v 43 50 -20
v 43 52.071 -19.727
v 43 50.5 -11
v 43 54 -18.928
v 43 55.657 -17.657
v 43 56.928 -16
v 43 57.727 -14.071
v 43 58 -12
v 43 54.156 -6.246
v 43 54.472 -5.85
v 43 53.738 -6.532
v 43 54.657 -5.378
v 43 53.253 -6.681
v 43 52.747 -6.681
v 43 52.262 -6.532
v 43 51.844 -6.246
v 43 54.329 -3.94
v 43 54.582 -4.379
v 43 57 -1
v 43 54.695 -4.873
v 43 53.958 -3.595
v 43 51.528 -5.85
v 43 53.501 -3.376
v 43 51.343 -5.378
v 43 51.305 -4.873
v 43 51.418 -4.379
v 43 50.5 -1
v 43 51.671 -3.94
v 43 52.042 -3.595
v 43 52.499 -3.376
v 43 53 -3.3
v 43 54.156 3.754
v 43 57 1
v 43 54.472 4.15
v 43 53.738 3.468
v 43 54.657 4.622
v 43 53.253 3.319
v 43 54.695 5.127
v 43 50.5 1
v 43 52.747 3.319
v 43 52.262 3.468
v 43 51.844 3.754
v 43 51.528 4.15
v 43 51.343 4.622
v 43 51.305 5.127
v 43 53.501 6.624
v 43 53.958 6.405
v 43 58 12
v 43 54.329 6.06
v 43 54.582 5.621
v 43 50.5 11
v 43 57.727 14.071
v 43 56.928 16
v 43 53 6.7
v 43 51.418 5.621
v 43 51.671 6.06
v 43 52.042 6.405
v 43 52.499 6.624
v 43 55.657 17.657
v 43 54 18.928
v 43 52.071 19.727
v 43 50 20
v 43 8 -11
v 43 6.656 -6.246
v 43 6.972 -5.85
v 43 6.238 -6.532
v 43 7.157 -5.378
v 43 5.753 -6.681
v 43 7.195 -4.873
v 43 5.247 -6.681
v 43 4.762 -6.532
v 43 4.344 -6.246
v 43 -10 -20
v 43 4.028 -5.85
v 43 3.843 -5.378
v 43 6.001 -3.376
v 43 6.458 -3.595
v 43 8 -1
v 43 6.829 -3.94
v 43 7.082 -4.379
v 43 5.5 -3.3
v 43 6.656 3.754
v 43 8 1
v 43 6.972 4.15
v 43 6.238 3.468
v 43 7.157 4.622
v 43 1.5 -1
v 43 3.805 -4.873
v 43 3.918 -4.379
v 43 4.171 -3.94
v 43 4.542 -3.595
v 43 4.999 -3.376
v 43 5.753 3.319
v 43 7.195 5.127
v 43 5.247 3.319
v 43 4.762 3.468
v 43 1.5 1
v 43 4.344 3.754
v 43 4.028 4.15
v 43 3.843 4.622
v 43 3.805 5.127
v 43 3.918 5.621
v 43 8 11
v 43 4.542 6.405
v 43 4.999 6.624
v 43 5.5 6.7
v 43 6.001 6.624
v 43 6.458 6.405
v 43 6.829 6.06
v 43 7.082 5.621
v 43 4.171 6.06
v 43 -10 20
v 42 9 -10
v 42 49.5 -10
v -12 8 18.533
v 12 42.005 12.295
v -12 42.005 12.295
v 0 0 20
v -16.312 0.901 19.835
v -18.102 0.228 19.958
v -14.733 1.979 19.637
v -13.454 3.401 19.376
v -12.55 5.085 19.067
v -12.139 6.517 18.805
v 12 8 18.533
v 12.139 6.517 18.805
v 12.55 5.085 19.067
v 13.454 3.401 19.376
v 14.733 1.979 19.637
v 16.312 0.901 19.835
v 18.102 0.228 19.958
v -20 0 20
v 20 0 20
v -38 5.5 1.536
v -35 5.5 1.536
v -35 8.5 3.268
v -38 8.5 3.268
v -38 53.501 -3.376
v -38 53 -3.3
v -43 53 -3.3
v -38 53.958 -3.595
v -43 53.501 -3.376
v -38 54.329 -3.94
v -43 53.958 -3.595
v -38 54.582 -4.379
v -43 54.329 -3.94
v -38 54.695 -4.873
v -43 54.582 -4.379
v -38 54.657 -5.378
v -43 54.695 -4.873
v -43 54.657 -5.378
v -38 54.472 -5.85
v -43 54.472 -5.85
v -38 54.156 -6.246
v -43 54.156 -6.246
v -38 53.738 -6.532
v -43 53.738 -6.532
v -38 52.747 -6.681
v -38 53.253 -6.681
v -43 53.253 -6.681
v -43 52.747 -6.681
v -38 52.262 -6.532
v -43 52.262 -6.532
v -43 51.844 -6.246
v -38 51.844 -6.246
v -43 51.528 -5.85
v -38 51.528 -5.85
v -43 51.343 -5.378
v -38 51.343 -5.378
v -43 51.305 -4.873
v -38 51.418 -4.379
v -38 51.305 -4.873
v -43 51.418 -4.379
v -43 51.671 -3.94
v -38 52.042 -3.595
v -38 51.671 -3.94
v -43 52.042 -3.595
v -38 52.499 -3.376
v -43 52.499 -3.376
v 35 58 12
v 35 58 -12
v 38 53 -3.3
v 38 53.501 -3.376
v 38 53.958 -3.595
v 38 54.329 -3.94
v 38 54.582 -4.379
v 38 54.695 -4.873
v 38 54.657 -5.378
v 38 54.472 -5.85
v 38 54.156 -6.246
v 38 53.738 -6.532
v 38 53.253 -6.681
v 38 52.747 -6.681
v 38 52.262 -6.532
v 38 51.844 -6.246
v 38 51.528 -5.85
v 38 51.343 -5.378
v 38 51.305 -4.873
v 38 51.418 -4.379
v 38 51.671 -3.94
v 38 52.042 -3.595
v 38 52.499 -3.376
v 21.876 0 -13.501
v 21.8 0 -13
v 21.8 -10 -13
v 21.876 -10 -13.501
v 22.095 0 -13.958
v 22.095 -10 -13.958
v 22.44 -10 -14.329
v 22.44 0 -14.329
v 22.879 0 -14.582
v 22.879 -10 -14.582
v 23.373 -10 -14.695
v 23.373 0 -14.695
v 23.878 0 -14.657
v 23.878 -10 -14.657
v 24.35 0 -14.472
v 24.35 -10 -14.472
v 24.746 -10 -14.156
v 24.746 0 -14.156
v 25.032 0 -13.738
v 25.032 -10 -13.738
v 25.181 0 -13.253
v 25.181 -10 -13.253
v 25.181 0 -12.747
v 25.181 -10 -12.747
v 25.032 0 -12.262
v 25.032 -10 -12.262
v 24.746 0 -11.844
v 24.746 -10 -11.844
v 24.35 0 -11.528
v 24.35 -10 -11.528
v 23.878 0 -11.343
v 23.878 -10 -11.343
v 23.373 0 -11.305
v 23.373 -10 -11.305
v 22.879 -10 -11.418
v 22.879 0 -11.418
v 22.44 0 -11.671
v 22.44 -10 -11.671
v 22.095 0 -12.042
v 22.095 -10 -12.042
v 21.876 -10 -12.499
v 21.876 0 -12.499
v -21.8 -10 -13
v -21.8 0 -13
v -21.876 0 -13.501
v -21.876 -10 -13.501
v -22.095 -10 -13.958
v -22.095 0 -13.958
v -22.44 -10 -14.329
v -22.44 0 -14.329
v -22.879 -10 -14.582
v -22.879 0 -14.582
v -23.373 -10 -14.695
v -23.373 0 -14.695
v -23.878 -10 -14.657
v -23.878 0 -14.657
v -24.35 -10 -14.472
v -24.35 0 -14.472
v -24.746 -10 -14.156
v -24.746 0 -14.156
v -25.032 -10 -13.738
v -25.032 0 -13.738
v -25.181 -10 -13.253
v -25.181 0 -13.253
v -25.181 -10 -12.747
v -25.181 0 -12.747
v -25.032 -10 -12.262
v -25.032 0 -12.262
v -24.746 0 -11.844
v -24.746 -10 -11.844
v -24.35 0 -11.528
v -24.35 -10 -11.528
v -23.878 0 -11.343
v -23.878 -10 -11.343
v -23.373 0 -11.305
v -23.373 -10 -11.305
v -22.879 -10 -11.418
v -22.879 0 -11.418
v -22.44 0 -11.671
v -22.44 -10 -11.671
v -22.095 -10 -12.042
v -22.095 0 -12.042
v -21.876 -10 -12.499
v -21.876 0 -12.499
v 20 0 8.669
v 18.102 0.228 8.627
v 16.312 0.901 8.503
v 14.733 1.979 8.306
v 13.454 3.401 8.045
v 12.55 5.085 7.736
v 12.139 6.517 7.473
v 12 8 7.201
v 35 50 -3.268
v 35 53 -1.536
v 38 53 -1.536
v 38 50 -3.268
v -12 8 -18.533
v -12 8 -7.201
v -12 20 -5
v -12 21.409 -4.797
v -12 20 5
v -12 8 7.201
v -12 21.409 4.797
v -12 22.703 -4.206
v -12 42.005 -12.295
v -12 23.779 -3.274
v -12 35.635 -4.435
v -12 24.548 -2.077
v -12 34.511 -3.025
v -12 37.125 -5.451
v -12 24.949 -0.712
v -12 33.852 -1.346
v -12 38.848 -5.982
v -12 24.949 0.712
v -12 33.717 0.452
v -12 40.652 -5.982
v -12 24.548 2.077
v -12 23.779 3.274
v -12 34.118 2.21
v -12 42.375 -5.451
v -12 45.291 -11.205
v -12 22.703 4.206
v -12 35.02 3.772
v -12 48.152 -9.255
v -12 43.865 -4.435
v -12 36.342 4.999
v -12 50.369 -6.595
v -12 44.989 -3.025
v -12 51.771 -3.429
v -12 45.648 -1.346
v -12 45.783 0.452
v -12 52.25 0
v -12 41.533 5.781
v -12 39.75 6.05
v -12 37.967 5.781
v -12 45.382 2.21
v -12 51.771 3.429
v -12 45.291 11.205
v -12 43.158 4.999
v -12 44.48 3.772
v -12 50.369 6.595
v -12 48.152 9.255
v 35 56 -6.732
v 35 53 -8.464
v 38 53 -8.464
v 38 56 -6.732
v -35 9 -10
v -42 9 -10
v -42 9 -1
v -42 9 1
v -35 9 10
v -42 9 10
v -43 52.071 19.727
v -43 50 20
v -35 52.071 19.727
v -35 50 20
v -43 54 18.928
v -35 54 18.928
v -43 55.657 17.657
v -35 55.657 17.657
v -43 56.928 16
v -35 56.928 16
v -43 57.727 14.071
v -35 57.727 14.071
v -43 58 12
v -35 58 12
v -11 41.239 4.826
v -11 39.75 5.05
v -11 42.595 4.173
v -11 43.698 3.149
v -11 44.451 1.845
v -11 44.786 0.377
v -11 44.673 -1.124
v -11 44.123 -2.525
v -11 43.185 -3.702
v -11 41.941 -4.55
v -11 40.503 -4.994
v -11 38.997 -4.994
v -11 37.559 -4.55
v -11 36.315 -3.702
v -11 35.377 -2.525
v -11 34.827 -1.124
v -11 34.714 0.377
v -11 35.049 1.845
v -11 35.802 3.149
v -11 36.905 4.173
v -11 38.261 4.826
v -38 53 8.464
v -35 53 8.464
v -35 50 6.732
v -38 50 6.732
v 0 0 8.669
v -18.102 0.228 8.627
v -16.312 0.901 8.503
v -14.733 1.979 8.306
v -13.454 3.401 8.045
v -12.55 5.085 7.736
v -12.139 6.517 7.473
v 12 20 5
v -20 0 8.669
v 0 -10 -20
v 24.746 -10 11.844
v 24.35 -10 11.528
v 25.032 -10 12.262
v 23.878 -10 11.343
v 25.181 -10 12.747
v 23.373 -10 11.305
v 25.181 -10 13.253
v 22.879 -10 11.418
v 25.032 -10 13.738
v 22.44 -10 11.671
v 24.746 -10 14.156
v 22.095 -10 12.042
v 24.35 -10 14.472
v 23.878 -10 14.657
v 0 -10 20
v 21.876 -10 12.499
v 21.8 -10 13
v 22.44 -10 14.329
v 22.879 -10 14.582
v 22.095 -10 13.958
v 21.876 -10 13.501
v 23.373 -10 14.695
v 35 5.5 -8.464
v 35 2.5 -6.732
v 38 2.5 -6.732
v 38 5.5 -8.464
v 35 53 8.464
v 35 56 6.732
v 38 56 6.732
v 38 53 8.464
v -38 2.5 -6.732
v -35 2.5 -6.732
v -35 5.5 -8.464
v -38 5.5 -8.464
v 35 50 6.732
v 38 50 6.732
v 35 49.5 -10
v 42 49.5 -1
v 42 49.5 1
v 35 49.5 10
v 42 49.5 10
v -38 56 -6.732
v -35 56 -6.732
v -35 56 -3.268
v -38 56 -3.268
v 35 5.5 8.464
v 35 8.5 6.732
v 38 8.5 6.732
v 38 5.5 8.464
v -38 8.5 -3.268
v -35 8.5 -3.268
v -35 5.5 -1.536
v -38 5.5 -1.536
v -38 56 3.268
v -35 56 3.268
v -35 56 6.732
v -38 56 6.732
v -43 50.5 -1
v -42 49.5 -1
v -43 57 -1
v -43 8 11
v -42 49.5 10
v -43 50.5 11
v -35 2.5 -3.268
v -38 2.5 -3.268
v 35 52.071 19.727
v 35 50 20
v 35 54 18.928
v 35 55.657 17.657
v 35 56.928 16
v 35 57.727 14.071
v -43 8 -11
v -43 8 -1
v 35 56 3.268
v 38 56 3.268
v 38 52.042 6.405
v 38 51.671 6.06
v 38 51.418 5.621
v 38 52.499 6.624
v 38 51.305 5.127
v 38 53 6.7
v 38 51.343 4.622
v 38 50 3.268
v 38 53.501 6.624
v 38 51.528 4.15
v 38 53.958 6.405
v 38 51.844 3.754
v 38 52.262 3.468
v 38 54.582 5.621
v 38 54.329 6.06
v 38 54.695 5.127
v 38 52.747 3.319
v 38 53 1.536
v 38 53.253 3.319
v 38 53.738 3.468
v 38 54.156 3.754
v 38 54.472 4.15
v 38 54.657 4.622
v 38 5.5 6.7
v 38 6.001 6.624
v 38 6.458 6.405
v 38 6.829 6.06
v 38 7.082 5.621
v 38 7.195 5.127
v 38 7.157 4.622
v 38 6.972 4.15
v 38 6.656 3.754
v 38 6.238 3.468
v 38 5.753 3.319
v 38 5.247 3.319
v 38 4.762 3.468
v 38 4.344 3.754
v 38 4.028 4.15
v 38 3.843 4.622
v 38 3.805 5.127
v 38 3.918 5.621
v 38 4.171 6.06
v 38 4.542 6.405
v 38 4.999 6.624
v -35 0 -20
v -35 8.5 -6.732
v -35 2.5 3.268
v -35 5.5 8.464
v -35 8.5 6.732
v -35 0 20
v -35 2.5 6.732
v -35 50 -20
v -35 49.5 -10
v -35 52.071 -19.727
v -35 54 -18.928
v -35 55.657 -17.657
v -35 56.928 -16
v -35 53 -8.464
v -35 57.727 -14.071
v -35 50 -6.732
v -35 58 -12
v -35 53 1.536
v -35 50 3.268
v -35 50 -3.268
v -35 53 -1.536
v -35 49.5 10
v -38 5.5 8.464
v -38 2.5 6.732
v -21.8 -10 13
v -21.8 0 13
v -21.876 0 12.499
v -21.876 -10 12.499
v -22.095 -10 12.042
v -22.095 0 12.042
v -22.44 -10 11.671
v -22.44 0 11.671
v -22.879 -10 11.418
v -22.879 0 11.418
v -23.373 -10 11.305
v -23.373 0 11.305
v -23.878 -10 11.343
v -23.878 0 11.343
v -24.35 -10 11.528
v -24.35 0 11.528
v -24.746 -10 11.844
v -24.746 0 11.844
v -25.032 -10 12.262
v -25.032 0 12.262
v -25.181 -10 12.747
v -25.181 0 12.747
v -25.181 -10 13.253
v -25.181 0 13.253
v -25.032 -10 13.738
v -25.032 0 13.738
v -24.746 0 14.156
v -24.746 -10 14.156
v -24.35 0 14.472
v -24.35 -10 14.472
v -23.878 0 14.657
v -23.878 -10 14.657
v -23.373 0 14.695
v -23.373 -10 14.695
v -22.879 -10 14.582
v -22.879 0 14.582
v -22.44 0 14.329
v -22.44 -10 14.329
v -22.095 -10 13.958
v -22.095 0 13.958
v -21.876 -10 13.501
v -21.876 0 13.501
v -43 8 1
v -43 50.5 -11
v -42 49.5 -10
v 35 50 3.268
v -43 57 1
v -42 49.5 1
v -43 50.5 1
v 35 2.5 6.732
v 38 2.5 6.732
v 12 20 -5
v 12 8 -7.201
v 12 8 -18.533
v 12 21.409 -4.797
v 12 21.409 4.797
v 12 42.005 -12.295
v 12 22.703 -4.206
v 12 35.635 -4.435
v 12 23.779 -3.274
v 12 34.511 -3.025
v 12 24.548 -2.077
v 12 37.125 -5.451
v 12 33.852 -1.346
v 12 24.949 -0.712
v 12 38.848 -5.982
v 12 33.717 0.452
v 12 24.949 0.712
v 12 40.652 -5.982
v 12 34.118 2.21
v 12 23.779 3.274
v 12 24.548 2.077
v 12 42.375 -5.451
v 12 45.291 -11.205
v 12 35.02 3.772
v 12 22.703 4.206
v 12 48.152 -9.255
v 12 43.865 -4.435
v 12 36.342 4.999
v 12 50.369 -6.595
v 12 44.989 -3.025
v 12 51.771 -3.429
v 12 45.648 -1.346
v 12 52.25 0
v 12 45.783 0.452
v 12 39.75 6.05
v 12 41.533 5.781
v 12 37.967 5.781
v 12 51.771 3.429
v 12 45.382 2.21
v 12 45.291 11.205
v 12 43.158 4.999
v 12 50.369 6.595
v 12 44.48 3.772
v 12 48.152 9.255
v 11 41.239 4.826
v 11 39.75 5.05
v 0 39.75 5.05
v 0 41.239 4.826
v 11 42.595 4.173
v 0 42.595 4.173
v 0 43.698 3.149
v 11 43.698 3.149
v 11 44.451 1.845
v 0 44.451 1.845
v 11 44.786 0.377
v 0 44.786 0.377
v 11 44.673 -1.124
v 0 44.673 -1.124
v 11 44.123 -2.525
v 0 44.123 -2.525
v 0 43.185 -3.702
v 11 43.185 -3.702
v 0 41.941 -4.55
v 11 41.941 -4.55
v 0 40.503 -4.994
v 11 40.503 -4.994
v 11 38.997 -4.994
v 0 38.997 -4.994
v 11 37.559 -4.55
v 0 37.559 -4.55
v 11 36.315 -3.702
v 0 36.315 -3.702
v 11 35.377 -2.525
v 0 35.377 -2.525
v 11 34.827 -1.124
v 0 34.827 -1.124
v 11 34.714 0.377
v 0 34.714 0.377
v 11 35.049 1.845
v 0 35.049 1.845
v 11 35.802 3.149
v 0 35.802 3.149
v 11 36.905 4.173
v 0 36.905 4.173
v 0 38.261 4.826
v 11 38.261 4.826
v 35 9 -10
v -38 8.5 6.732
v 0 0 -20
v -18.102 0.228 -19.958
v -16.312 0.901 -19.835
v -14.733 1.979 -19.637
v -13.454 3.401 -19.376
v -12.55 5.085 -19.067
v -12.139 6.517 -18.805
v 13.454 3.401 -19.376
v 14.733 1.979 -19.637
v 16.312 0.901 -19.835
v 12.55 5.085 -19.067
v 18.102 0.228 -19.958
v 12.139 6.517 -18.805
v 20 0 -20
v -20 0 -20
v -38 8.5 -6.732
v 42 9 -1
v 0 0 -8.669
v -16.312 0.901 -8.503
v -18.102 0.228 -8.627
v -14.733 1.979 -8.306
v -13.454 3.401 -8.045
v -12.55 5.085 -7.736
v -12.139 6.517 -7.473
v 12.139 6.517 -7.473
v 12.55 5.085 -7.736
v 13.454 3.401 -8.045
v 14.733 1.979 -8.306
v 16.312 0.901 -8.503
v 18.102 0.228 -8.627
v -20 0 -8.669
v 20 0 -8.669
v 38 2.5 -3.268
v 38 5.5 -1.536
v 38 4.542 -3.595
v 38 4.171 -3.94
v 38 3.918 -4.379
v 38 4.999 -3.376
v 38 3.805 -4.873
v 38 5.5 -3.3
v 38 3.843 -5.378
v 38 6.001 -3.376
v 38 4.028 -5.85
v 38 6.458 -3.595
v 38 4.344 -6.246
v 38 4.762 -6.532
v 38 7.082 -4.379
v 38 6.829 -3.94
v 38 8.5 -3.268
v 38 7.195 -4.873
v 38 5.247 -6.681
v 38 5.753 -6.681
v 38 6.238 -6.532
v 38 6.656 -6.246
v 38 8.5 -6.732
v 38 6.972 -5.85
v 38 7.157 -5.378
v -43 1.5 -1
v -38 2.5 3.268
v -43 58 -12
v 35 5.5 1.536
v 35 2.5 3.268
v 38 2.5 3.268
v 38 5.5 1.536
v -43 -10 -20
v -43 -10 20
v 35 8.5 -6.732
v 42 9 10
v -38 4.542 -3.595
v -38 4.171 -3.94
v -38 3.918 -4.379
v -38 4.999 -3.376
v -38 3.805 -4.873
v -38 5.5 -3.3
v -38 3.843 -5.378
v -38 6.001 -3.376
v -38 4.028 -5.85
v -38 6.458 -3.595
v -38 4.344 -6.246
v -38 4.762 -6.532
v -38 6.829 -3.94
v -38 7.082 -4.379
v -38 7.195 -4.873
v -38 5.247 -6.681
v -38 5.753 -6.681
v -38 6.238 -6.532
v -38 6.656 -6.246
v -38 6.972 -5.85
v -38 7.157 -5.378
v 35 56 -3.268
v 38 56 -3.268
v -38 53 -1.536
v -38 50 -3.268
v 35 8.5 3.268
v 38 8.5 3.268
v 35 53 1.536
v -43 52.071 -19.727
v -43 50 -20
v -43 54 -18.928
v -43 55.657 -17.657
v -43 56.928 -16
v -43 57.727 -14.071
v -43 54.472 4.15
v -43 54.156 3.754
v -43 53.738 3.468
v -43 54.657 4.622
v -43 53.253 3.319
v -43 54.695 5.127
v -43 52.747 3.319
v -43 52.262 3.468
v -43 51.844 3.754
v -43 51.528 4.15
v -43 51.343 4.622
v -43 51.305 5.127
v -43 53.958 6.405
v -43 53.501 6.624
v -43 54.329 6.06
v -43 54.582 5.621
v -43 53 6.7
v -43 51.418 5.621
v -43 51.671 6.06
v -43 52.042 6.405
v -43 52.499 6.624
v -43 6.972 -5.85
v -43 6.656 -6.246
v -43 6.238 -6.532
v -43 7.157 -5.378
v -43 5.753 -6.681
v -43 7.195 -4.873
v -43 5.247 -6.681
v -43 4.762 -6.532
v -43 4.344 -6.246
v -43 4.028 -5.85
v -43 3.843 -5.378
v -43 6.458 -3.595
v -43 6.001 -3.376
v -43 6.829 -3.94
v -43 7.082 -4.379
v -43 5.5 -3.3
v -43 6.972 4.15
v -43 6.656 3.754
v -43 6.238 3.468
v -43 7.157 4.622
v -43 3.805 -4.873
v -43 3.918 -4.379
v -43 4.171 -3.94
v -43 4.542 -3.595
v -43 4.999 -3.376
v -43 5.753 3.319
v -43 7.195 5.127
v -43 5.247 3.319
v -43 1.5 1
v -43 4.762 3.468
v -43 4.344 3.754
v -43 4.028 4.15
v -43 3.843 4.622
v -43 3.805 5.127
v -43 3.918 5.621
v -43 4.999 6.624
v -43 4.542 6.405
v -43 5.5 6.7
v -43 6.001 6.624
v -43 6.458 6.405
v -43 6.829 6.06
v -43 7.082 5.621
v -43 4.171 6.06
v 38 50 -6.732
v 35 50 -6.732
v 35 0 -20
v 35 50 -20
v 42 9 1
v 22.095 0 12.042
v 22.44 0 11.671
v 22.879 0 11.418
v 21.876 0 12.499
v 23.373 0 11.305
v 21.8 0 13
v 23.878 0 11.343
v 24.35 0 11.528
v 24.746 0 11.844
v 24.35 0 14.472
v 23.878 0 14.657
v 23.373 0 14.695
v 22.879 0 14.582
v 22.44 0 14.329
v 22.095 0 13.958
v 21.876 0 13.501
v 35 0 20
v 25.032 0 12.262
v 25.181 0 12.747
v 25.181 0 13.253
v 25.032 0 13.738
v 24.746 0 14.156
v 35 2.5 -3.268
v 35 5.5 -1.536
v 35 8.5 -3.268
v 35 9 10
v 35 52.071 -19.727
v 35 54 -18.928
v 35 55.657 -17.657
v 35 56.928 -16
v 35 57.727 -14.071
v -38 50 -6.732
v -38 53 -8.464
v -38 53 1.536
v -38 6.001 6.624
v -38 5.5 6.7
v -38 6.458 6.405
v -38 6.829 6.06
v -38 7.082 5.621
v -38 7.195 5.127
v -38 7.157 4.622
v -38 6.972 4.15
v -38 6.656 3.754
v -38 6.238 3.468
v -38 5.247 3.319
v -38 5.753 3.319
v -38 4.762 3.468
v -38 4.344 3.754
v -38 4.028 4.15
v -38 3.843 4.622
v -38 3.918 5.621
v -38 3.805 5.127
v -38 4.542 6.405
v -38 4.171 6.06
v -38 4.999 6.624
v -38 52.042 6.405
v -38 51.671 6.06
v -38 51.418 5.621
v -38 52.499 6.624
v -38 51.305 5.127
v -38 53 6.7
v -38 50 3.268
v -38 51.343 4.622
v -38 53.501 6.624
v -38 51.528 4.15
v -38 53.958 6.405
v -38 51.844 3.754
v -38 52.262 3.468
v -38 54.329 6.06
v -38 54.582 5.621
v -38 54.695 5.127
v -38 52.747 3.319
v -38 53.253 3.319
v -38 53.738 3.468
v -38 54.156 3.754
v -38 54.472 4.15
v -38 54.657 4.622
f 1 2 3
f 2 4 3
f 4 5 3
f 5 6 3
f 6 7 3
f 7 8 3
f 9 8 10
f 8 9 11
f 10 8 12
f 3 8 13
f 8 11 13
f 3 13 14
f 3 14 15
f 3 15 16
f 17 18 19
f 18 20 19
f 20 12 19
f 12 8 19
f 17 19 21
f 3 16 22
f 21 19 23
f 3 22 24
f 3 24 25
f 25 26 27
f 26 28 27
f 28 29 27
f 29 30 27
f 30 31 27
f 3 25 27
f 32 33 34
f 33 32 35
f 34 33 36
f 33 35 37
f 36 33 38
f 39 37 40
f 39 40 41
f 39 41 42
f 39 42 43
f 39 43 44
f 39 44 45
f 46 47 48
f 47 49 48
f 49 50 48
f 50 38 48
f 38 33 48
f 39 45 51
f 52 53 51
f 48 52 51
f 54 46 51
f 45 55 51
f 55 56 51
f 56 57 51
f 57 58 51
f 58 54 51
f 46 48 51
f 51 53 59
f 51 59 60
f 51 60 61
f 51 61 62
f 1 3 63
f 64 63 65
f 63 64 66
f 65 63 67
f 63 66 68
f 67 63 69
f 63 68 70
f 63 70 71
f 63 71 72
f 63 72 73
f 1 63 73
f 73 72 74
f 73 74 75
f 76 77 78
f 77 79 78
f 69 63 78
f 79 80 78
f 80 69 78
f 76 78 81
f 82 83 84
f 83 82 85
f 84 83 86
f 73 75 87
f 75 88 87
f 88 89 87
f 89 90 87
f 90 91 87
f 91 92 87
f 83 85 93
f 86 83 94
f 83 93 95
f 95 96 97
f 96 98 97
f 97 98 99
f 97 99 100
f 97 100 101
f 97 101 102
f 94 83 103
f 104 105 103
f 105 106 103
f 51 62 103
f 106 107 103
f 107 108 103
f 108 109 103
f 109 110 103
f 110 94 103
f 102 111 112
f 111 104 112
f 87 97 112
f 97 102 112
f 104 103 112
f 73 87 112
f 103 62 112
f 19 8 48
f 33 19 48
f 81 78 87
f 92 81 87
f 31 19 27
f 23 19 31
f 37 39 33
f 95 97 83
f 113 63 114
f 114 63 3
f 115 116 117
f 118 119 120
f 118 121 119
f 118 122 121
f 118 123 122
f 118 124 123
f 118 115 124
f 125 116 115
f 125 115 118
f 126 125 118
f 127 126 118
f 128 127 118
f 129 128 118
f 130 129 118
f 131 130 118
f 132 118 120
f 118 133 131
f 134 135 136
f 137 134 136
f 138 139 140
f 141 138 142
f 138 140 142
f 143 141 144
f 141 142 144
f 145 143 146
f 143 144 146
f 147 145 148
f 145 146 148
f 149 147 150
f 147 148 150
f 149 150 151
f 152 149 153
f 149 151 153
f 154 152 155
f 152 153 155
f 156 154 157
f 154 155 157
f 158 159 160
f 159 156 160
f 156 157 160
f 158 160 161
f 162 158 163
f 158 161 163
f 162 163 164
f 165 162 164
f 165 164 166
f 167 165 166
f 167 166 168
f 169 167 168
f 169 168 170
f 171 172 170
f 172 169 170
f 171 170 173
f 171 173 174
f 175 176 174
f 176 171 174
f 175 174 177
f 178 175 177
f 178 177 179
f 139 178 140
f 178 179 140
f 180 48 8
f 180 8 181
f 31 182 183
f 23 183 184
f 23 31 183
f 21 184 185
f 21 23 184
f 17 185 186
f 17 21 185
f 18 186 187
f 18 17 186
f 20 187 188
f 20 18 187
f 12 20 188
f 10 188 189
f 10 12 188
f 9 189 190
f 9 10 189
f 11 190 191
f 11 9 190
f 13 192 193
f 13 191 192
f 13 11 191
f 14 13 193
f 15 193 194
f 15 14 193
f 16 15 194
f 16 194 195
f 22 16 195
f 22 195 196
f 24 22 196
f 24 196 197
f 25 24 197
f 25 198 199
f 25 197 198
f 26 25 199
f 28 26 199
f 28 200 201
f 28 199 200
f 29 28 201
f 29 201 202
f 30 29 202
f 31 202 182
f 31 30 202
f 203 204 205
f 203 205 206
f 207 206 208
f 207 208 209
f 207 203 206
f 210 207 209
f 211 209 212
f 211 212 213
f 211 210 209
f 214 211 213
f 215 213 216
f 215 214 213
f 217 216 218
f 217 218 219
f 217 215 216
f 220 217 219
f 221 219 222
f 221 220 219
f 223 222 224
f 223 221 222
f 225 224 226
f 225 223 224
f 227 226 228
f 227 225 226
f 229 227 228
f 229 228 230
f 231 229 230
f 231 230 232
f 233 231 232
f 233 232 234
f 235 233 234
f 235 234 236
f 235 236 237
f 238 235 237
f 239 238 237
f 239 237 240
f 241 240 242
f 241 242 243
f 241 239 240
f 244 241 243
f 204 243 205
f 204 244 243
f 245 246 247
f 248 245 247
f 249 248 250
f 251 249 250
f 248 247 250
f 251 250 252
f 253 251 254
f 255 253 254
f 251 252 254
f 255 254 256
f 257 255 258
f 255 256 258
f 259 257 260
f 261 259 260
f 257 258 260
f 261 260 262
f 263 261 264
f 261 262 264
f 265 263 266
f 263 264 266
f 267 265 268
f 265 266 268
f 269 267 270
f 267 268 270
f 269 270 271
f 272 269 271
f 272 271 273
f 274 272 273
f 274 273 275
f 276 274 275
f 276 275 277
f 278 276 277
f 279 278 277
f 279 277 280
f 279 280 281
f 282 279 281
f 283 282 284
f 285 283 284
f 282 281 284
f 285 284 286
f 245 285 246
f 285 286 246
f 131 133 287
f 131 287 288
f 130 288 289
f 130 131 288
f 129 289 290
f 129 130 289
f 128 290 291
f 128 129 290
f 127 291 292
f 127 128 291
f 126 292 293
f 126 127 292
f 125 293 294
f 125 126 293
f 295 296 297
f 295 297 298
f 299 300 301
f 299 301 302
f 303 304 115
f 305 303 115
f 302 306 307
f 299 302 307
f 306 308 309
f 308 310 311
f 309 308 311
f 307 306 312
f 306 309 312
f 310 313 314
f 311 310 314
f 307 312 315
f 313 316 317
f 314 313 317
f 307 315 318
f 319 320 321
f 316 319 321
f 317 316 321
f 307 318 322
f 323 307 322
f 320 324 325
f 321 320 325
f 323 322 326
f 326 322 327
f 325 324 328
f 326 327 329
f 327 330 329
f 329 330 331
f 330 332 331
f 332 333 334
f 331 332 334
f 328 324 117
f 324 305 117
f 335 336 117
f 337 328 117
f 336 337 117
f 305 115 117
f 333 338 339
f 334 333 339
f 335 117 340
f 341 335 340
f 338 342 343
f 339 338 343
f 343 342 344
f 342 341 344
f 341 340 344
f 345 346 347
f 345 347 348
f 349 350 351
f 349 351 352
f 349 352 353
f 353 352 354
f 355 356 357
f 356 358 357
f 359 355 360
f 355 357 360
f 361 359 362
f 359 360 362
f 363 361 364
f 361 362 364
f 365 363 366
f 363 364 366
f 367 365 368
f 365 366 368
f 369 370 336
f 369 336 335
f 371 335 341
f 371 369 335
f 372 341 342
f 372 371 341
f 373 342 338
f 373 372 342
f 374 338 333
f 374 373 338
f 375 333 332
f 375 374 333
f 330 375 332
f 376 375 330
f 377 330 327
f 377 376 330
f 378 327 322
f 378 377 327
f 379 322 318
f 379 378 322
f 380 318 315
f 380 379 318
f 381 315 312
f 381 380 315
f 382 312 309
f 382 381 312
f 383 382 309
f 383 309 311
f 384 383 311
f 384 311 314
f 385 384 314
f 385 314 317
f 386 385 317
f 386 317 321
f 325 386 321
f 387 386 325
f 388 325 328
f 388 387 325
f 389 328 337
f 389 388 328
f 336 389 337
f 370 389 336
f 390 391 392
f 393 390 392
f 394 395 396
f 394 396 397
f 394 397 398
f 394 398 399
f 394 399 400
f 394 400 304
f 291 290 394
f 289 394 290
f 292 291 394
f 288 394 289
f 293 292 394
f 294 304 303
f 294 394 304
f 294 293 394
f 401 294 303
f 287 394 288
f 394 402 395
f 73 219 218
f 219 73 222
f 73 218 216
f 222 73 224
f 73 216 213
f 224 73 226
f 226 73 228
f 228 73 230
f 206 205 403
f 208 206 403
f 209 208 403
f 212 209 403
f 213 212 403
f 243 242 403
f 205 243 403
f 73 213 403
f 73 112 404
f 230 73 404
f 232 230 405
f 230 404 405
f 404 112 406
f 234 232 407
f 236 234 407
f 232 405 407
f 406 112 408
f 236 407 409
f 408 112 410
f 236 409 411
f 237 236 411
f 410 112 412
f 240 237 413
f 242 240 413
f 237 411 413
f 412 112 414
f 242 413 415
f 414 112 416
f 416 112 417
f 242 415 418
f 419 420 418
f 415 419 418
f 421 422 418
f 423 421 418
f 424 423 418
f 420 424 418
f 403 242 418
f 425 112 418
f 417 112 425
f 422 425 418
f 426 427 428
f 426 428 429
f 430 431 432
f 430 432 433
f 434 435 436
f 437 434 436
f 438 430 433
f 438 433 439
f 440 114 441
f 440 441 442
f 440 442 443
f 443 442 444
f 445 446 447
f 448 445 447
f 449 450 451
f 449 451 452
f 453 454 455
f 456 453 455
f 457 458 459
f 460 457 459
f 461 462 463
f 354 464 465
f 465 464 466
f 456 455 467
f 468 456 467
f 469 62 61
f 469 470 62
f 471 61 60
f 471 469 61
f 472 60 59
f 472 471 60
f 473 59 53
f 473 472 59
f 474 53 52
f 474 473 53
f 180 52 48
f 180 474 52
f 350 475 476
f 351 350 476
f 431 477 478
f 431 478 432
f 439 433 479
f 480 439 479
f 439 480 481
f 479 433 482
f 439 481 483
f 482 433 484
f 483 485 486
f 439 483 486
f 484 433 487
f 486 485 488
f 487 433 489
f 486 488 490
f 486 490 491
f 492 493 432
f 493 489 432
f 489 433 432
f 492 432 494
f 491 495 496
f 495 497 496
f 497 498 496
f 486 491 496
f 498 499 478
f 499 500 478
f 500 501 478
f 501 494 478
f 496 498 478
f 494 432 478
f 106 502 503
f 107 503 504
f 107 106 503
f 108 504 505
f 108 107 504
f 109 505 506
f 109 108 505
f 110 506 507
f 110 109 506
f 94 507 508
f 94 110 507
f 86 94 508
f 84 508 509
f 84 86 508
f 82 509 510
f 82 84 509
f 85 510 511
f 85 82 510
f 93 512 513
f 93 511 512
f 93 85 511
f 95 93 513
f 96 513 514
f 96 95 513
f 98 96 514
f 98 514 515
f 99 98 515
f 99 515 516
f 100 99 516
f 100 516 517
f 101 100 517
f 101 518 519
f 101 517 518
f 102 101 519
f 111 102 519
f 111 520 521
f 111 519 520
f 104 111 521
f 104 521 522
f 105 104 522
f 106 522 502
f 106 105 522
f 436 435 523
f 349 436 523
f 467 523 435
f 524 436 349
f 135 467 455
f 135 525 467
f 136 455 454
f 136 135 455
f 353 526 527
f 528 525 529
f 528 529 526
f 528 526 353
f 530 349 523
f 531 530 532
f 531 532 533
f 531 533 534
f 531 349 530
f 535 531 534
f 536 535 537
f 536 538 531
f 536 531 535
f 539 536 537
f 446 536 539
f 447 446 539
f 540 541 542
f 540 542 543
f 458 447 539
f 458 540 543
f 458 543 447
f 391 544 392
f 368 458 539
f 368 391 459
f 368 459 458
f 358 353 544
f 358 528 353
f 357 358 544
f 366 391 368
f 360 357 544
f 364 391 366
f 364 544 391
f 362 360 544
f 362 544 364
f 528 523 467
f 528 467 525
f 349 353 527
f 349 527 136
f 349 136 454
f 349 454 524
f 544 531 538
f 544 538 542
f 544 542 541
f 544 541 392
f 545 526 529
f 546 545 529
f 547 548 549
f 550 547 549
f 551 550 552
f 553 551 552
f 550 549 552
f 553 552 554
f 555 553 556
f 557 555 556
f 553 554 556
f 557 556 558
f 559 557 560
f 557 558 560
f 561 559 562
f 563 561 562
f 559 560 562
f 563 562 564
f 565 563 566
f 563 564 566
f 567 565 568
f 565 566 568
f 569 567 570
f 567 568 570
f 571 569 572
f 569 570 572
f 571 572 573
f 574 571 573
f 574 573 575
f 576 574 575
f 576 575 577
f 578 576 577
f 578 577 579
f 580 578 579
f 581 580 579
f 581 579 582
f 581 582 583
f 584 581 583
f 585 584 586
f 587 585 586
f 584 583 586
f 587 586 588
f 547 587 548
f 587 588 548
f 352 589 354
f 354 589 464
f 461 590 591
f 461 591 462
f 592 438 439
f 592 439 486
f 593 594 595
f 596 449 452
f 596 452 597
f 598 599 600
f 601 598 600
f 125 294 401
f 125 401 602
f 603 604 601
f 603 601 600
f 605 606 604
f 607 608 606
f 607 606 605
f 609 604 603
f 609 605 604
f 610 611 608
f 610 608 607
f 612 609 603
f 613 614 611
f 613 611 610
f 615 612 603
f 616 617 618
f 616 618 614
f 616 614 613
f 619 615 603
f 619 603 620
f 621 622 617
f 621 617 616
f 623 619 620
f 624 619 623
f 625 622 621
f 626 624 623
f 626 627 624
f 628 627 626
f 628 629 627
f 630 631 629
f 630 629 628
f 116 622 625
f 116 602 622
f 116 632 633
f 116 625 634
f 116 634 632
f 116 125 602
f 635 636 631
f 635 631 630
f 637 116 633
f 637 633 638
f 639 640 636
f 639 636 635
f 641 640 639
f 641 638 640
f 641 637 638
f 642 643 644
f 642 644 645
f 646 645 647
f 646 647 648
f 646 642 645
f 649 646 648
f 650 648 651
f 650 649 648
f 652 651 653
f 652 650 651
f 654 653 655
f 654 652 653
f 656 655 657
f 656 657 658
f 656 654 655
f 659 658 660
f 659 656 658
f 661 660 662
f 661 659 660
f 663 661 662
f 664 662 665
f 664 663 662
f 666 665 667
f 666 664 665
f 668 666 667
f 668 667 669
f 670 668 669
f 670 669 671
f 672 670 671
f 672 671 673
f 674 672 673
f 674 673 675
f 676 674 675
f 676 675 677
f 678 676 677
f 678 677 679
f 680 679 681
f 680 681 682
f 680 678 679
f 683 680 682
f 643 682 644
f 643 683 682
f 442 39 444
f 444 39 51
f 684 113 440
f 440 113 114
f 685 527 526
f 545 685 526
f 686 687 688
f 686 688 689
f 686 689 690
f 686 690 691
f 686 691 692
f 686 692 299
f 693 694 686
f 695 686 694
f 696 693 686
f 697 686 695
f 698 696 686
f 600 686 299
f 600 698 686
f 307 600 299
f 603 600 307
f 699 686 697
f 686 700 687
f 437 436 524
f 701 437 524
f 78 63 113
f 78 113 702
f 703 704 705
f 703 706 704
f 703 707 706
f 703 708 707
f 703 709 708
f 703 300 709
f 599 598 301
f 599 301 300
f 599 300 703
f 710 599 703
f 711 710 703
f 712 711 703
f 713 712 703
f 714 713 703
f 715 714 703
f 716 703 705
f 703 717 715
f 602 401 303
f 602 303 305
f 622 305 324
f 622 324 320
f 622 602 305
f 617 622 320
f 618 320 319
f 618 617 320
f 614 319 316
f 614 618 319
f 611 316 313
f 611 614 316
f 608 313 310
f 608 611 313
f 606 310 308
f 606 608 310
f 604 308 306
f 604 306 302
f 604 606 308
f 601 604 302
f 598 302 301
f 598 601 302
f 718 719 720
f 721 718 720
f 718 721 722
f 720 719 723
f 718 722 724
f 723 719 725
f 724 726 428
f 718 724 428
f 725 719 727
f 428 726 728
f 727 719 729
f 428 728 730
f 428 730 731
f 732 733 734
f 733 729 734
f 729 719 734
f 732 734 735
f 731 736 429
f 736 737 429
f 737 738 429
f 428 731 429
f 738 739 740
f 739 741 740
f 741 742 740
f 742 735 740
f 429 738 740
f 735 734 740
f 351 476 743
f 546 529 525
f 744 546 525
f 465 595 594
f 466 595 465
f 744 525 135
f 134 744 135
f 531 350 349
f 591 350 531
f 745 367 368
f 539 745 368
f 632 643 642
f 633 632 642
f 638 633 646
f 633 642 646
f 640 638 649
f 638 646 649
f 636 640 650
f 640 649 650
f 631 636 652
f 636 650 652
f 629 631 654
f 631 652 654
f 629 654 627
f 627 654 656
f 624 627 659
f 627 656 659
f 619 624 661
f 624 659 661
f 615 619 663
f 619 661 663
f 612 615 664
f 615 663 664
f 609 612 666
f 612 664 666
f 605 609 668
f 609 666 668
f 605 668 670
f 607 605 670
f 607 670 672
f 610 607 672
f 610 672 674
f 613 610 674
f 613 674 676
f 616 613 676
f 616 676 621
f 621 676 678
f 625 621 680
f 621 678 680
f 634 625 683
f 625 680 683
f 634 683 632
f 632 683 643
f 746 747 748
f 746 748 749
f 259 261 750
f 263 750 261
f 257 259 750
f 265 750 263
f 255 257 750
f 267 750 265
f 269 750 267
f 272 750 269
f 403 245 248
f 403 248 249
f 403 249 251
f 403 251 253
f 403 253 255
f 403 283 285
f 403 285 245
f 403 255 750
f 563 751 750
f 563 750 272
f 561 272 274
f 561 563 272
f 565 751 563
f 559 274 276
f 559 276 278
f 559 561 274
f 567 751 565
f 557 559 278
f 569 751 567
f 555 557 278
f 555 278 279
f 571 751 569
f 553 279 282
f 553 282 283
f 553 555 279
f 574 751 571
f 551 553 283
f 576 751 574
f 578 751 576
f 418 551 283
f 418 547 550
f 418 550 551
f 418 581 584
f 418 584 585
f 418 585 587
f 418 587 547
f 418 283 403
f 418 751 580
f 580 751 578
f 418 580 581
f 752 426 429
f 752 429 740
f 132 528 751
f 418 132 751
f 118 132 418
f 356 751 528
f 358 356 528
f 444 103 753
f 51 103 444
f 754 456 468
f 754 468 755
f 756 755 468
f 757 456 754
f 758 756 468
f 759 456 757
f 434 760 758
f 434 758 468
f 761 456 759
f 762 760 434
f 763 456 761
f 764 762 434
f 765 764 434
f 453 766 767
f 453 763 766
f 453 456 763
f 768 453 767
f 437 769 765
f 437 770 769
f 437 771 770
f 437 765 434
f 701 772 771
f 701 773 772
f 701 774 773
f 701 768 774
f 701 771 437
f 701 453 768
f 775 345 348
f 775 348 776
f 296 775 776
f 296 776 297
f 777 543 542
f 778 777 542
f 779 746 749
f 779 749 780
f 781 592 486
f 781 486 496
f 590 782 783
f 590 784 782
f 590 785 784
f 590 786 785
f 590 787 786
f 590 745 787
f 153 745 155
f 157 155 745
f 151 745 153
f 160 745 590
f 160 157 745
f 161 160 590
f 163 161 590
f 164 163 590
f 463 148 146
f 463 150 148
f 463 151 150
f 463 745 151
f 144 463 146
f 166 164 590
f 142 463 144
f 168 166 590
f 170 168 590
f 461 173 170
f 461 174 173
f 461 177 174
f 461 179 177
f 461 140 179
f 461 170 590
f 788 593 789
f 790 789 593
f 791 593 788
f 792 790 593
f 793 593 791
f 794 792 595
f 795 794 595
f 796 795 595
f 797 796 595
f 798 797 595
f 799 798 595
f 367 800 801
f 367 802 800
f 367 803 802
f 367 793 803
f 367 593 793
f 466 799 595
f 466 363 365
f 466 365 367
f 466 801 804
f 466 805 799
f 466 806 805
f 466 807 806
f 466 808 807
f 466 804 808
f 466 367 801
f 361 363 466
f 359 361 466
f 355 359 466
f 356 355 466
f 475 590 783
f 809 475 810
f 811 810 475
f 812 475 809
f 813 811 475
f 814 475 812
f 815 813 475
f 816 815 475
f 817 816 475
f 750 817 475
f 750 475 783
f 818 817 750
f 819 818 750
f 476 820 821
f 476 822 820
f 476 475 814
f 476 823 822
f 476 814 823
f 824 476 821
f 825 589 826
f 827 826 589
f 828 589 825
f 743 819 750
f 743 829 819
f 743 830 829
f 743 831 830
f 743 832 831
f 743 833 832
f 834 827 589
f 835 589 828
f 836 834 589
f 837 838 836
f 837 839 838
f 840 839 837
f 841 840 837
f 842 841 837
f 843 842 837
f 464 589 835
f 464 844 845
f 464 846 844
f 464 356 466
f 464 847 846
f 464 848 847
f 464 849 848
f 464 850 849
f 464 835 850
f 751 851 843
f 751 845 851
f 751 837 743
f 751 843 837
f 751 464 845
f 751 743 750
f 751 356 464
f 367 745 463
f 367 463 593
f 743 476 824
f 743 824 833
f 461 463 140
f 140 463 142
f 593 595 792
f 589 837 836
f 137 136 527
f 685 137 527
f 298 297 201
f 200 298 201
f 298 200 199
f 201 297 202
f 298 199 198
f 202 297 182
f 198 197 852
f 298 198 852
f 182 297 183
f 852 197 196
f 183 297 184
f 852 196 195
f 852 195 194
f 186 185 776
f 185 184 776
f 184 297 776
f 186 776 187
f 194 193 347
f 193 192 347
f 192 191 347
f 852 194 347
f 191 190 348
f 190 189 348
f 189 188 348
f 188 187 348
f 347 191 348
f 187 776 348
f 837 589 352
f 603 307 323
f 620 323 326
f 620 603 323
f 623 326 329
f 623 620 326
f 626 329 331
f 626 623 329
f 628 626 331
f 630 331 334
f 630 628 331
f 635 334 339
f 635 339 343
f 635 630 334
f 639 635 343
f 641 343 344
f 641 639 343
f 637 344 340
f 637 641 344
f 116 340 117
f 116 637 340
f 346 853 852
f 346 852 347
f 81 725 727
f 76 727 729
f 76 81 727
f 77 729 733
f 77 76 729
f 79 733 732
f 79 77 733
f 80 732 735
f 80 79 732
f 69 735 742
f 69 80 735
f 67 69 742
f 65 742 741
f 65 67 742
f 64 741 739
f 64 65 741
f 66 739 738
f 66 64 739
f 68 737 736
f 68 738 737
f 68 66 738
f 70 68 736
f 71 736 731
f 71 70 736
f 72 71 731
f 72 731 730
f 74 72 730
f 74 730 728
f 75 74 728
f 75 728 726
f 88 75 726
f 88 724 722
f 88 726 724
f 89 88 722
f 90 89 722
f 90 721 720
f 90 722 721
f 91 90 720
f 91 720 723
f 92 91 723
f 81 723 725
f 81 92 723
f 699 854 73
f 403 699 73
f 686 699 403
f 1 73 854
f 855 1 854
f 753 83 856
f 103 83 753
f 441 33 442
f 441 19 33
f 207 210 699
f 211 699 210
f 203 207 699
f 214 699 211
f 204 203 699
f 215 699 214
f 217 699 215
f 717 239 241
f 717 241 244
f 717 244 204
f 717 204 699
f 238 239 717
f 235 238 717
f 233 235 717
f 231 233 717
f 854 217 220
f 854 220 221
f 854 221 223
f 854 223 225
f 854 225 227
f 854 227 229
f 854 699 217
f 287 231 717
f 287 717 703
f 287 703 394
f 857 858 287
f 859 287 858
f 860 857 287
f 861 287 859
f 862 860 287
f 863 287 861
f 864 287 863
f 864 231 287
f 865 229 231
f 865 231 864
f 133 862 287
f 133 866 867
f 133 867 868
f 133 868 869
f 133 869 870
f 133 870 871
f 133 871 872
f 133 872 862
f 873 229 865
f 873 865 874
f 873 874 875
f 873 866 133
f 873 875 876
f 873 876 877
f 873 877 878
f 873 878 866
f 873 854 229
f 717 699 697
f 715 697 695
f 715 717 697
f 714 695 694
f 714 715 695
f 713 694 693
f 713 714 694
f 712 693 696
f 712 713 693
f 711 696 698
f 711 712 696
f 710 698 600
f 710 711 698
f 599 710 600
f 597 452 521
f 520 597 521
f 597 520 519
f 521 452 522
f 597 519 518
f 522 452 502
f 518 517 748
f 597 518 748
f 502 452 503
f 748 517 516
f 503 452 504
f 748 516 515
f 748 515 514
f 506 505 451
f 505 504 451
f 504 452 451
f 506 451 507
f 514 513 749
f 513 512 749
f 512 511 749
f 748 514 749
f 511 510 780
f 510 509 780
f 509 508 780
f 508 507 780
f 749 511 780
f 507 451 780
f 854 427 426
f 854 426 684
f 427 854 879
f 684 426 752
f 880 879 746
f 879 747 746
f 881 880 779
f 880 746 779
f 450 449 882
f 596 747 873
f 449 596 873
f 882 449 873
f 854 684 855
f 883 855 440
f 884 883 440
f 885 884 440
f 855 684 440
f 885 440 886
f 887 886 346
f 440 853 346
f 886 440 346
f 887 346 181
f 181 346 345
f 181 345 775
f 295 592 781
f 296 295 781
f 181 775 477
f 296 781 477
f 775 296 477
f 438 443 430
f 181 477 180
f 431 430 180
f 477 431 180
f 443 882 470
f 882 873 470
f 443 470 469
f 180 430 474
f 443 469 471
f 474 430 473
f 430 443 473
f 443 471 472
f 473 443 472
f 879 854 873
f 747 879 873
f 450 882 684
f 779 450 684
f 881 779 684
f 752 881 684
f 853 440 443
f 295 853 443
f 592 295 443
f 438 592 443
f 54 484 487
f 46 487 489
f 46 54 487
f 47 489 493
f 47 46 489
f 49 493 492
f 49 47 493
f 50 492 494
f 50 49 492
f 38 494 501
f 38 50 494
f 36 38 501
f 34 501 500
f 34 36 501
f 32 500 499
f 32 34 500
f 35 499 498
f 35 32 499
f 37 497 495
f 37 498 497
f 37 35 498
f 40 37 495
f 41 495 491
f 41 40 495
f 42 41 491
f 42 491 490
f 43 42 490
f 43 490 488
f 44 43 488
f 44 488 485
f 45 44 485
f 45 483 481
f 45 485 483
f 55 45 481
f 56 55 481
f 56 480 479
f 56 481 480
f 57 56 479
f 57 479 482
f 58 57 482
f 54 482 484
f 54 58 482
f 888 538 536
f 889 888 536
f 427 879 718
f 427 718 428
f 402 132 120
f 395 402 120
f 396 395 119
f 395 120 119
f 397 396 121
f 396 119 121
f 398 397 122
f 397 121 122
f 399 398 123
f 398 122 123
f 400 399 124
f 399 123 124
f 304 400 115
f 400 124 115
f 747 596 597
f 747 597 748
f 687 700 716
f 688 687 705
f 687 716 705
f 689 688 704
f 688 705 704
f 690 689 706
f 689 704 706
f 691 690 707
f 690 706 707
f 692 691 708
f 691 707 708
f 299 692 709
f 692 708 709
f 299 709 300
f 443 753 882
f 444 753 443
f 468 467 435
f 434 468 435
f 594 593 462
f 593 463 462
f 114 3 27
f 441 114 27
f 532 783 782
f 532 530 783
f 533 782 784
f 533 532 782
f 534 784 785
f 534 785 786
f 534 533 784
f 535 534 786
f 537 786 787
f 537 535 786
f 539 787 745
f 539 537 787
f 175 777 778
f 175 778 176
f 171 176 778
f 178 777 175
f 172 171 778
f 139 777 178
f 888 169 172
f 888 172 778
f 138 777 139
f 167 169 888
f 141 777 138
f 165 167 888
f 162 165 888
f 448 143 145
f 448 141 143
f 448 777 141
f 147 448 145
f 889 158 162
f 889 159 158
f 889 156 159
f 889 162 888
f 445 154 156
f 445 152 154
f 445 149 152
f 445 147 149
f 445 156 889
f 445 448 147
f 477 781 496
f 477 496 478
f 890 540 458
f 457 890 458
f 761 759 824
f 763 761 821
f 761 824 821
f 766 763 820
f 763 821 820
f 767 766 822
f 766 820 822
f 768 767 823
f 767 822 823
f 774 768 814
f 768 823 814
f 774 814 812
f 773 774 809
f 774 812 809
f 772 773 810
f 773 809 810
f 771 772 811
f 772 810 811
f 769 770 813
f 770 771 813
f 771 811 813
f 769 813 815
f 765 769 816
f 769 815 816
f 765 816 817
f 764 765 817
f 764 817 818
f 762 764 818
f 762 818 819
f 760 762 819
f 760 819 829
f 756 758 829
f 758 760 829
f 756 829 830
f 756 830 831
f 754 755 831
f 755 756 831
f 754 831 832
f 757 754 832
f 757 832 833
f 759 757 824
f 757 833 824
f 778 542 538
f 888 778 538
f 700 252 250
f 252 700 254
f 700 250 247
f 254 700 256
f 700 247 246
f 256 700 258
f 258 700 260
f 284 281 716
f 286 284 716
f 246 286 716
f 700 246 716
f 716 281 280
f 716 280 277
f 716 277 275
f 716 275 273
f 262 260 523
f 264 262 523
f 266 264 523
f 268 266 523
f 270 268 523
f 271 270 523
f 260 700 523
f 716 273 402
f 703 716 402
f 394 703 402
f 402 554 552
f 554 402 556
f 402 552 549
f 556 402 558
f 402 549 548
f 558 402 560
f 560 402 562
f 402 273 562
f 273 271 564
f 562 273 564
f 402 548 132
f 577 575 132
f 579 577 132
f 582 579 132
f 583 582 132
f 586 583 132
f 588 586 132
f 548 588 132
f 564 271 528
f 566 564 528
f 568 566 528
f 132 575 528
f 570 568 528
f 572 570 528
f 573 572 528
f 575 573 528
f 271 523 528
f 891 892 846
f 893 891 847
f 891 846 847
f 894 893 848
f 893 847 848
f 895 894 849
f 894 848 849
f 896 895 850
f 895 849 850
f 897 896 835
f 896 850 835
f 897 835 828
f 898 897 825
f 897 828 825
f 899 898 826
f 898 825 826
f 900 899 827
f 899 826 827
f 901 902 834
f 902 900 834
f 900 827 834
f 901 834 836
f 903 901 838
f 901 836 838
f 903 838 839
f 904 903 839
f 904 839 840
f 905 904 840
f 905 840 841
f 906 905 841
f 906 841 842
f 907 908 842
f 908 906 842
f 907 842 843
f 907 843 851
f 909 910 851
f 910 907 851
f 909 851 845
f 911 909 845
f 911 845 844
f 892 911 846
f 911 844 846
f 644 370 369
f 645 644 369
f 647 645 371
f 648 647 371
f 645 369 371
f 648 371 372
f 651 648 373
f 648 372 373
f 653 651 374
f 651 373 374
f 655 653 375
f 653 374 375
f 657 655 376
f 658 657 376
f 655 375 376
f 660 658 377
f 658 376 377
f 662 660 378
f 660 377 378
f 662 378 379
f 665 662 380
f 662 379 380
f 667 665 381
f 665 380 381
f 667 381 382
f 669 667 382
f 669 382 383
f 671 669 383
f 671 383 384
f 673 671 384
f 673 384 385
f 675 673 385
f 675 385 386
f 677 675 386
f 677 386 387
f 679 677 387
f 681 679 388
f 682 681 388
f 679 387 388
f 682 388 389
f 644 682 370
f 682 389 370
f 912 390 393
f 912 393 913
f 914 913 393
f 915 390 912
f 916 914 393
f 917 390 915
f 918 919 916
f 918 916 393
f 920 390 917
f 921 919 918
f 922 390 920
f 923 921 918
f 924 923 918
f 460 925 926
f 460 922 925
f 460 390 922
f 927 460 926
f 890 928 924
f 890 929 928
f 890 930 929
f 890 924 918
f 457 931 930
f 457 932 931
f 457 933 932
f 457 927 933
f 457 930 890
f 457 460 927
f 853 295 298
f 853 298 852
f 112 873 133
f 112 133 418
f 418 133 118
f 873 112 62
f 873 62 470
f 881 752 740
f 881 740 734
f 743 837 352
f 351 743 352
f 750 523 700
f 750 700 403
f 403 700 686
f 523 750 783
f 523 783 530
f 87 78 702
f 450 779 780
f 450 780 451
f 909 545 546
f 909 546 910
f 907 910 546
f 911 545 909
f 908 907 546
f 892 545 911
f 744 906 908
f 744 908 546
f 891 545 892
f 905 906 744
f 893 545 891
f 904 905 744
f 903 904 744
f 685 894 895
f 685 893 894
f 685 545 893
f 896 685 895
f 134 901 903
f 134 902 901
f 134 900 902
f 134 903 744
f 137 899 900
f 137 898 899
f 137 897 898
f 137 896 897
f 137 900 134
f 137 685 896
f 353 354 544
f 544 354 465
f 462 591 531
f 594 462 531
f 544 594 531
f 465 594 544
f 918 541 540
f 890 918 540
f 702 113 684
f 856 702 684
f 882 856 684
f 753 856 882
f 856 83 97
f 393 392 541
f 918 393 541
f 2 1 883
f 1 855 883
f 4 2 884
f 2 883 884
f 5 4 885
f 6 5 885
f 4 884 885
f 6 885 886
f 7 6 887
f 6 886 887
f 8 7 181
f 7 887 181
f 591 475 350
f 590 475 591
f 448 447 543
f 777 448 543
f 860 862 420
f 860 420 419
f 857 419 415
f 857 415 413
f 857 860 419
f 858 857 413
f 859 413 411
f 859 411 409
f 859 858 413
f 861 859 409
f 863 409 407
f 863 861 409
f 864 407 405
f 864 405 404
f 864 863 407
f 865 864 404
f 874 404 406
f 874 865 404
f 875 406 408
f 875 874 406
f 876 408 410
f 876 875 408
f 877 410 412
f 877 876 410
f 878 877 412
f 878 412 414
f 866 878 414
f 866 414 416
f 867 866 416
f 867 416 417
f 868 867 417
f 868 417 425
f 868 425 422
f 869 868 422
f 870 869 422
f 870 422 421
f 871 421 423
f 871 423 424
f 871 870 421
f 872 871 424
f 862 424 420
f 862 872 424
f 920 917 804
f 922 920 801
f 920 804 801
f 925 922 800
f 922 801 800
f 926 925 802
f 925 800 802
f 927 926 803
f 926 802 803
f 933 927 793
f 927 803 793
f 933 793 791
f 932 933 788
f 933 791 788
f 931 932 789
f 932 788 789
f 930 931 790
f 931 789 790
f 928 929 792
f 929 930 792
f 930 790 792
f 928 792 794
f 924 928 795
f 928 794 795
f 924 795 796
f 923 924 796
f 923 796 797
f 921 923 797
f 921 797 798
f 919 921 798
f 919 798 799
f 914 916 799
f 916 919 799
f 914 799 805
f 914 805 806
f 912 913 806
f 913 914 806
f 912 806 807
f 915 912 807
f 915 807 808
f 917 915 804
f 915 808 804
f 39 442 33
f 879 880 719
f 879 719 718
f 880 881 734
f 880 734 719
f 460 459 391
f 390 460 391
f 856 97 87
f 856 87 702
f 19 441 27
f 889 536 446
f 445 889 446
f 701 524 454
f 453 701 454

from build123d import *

# Parameters (mm, degrees)
SKETCH_1_W             = 8
SKETCH_1_H             = 58
SKETCH_1_W_2           = 12
EXTRUDE_1_DEPTH        = 20
SKETCH_3_R             = 1.7
SKETCH_3_W             = 20
SKETCH_3_H             = 40.5
CUT_EXTRUDE_1575_DEPTH = 8
SKETCH_2_R             = 5.05
CUT_EXTRUDE_2513_DEPTH = 12
CUT_EXTRUDE_2852_DEPTH = 1
SKETCH_5_R             = 1.7
CUT_EXTRUDE_3257_DEPTH = 3
SKETCH_6_R             = 1.7
CUT_EXTRUDE_5_DEPTH    = 10
FILLET_1_R             = 8
CHAMFER_1_SIZE         = 1


with BuildPart() as part:
    # Эскиз1 → Бобышка-Вытянуть1 (new body, symmetric)
    with BuildSketch(Plane.XY):
        Polygon((0, -10), (0, 0), (-12, 0), (-35, 0), (-43, 0), (-43, -10), align=None)
        with Locations((-39, 29)):
            Rectangle(SKETCH_1_W, SKETCH_1_H)
        with Locations((-6, 29)):
            Rectangle(SKETCH_1_W_2, SKETCH_1_H)
    extrude(amount=EXTRUDE_1_DEPTH, both=True)

    # Эскиз3 → Cut-Extrude 1575 (cut)
    with BuildSketch(Plane.ZY.offset(43)):
        with Locations((-5, 53)):
            Circle(SKETCH_3_R)
        with Locations((5, 53)):
            Circle(SKETCH_3_R)
        with Locations((-5, 5.5)):
            Circle(SKETCH_3_R)
        with Locations((5, 5.5)):
            Circle(SKETCH_3_R)
        with Locations((0, 29.25)):
            Rectangle(SKETCH_3_W, SKETCH_3_H)
    extrude(amount=-CUT_EXTRUDE_1575_DEPTH, mode=Mode.SUBTRACT)

    # Эскиз2 → Cut-Extrude 2513 (cut)
    with BuildSketch(Plane.ZY.offset(12)):
        with BuildLine():
            Line((-20, 58), (-20, 0))
            Line((-20, 0), (-12.294865589, 42.005278284))
            ThreePointArc((-12.294865589, 42.005278284), (0, 52.25), (12.294865589, 42.005278284))
            Line((12.294865589, 42.005278284), (20, 0))
            Line((20, 0), (20, 58))
            Line((20, 58), (-20, 58))
        make_face()
        with BuildLine():
            Line((-5, 20), (-8.668650572, 0))
            Line((-8.668650572, 0), (8.668650572, 0))
            Line((8.668650572, 0), (5, 20))
            ThreePointArc((5, 20), (0, 25), (-5, 20))
        make_face()
        with Locations((0, 39.75)):
            Circle(SKETCH_2_R)
    extrude(amount=-CUT_EXTRUDE_2513_DEPTH, mode=Mode.SUBTRACT)

    # Эскиз4 → Cut-Extrude 2852 (cut, symmetric)
    with BuildSketch(Plane.XY):
        Polygon((-42, 49.5), (-43, 49.5), (-43, 57), align=None)
        Polygon((-43, 9), (-43, 1.5), (-42, 9), align=None)
    extrude(amount=CUT_EXTRUDE_2852_DEPTH, both=True, mode=Mode.SUBTRACT)

    # Эскиз5 → Cut-Extrude 3257 (cut)
    with BuildSketch(Plane(origin=(-35, 0, 0), x_dir=(0, 0, -1), z_dir=(1, 0, 0))):
        Polygon((-6.732050808, 56), (-8.464101615, 53), (-6.732050808, 50), (-3.267949192, 50), (-1.535898385, 53), (-3.267949192, 56), align=None)
        with Locations((-5, 53)):
            Circle(SKETCH_5_R, mode=Mode.SUBTRACT)
        Polygon((1.535898385, 53), (3.267949192, 50), (6.732050808, 50), (8.464101615, 53), (6.732050808, 56), (3.267949192, 56), align=None)
        with Locations((5, 53)):
            Circle(SKETCH_5_R, mode=Mode.SUBTRACT)
        Polygon((-6.732050808, 8.5), (-8.464101615, 5.5), (-6.732050808, 2.5), (-3.267949192, 2.5), (-1.535898385, 5.5), (-3.267949192, 8.5), align=None)
        with Locations((-5, 5.5)):
            Circle(SKETCH_5_R, mode=Mode.SUBTRACT)
        Polygon((1.535898385, 5.5), (3.267949192, 2.5), (6.732050808, 2.5), (8.464101615, 5.5), (6.732050808, 8.5), (3.267949192, 8.5), align=None)
        with Locations((5, 5.5)):
            Circle(SKETCH_5_R, mode=Mode.SUBTRACT)
    extrude(amount=-CUT_EXTRUDE_3257_DEPTH, mode=Mode.SUBTRACT)

    # Эскиз6 → Вырез-Вытянуть5 (cut)
    with BuildSketch(Plane(origin=(0, 0, 0), x_dir=(1, 0, 0), z_dir=(0, 1, 0))):
        with Locations((-23.5, 13)):
            Circle(SKETCH_6_R)
        with Locations((-23.5, -13)):
            Circle(SKETCH_6_R)
    extrude(amount=-CUT_EXTRUDE_5_DEPTH, mode=Mode.SUBTRACT)

    # Скругление1
    fillet_1_edges = [part.edges().sort_by_distance(p)[0] for p in [
        (-39, 58, -20),
        (-12, 0, 14.334325286),
        (-39, 58, 20),
        (-12, 0, -14.334325286),
    ]]
    fillet(fillet_1_edges, radius=FILLET_1_R)

    # Фаска1
    chamfer_1_edges = [part.edges().sort_by_distance(p)[0] for p in [
        (-12, 39.75, -5.05),
        (-43, 9, 5.5),
        (-43, 49.5, 5.5),
        (-43, 29.25, 10),
        (-43, 9, -5.5),
        (-43, 49.5, -5.5),
        (-43, 29.25, -10),
    ]]
    chamfer(chamfer_1_edges, length=CHAMFER_1_SIZE)

    # Зеркальное отражение2: part across face


with BuildPart() as part_1:
    add(part.part)
    add(part.part.mirror(Plane(origin=(0, 17.029159437, 0), x_dir=(0, 0, 1), z_dir=(1, 0, 0))))


solid = part_1.part
